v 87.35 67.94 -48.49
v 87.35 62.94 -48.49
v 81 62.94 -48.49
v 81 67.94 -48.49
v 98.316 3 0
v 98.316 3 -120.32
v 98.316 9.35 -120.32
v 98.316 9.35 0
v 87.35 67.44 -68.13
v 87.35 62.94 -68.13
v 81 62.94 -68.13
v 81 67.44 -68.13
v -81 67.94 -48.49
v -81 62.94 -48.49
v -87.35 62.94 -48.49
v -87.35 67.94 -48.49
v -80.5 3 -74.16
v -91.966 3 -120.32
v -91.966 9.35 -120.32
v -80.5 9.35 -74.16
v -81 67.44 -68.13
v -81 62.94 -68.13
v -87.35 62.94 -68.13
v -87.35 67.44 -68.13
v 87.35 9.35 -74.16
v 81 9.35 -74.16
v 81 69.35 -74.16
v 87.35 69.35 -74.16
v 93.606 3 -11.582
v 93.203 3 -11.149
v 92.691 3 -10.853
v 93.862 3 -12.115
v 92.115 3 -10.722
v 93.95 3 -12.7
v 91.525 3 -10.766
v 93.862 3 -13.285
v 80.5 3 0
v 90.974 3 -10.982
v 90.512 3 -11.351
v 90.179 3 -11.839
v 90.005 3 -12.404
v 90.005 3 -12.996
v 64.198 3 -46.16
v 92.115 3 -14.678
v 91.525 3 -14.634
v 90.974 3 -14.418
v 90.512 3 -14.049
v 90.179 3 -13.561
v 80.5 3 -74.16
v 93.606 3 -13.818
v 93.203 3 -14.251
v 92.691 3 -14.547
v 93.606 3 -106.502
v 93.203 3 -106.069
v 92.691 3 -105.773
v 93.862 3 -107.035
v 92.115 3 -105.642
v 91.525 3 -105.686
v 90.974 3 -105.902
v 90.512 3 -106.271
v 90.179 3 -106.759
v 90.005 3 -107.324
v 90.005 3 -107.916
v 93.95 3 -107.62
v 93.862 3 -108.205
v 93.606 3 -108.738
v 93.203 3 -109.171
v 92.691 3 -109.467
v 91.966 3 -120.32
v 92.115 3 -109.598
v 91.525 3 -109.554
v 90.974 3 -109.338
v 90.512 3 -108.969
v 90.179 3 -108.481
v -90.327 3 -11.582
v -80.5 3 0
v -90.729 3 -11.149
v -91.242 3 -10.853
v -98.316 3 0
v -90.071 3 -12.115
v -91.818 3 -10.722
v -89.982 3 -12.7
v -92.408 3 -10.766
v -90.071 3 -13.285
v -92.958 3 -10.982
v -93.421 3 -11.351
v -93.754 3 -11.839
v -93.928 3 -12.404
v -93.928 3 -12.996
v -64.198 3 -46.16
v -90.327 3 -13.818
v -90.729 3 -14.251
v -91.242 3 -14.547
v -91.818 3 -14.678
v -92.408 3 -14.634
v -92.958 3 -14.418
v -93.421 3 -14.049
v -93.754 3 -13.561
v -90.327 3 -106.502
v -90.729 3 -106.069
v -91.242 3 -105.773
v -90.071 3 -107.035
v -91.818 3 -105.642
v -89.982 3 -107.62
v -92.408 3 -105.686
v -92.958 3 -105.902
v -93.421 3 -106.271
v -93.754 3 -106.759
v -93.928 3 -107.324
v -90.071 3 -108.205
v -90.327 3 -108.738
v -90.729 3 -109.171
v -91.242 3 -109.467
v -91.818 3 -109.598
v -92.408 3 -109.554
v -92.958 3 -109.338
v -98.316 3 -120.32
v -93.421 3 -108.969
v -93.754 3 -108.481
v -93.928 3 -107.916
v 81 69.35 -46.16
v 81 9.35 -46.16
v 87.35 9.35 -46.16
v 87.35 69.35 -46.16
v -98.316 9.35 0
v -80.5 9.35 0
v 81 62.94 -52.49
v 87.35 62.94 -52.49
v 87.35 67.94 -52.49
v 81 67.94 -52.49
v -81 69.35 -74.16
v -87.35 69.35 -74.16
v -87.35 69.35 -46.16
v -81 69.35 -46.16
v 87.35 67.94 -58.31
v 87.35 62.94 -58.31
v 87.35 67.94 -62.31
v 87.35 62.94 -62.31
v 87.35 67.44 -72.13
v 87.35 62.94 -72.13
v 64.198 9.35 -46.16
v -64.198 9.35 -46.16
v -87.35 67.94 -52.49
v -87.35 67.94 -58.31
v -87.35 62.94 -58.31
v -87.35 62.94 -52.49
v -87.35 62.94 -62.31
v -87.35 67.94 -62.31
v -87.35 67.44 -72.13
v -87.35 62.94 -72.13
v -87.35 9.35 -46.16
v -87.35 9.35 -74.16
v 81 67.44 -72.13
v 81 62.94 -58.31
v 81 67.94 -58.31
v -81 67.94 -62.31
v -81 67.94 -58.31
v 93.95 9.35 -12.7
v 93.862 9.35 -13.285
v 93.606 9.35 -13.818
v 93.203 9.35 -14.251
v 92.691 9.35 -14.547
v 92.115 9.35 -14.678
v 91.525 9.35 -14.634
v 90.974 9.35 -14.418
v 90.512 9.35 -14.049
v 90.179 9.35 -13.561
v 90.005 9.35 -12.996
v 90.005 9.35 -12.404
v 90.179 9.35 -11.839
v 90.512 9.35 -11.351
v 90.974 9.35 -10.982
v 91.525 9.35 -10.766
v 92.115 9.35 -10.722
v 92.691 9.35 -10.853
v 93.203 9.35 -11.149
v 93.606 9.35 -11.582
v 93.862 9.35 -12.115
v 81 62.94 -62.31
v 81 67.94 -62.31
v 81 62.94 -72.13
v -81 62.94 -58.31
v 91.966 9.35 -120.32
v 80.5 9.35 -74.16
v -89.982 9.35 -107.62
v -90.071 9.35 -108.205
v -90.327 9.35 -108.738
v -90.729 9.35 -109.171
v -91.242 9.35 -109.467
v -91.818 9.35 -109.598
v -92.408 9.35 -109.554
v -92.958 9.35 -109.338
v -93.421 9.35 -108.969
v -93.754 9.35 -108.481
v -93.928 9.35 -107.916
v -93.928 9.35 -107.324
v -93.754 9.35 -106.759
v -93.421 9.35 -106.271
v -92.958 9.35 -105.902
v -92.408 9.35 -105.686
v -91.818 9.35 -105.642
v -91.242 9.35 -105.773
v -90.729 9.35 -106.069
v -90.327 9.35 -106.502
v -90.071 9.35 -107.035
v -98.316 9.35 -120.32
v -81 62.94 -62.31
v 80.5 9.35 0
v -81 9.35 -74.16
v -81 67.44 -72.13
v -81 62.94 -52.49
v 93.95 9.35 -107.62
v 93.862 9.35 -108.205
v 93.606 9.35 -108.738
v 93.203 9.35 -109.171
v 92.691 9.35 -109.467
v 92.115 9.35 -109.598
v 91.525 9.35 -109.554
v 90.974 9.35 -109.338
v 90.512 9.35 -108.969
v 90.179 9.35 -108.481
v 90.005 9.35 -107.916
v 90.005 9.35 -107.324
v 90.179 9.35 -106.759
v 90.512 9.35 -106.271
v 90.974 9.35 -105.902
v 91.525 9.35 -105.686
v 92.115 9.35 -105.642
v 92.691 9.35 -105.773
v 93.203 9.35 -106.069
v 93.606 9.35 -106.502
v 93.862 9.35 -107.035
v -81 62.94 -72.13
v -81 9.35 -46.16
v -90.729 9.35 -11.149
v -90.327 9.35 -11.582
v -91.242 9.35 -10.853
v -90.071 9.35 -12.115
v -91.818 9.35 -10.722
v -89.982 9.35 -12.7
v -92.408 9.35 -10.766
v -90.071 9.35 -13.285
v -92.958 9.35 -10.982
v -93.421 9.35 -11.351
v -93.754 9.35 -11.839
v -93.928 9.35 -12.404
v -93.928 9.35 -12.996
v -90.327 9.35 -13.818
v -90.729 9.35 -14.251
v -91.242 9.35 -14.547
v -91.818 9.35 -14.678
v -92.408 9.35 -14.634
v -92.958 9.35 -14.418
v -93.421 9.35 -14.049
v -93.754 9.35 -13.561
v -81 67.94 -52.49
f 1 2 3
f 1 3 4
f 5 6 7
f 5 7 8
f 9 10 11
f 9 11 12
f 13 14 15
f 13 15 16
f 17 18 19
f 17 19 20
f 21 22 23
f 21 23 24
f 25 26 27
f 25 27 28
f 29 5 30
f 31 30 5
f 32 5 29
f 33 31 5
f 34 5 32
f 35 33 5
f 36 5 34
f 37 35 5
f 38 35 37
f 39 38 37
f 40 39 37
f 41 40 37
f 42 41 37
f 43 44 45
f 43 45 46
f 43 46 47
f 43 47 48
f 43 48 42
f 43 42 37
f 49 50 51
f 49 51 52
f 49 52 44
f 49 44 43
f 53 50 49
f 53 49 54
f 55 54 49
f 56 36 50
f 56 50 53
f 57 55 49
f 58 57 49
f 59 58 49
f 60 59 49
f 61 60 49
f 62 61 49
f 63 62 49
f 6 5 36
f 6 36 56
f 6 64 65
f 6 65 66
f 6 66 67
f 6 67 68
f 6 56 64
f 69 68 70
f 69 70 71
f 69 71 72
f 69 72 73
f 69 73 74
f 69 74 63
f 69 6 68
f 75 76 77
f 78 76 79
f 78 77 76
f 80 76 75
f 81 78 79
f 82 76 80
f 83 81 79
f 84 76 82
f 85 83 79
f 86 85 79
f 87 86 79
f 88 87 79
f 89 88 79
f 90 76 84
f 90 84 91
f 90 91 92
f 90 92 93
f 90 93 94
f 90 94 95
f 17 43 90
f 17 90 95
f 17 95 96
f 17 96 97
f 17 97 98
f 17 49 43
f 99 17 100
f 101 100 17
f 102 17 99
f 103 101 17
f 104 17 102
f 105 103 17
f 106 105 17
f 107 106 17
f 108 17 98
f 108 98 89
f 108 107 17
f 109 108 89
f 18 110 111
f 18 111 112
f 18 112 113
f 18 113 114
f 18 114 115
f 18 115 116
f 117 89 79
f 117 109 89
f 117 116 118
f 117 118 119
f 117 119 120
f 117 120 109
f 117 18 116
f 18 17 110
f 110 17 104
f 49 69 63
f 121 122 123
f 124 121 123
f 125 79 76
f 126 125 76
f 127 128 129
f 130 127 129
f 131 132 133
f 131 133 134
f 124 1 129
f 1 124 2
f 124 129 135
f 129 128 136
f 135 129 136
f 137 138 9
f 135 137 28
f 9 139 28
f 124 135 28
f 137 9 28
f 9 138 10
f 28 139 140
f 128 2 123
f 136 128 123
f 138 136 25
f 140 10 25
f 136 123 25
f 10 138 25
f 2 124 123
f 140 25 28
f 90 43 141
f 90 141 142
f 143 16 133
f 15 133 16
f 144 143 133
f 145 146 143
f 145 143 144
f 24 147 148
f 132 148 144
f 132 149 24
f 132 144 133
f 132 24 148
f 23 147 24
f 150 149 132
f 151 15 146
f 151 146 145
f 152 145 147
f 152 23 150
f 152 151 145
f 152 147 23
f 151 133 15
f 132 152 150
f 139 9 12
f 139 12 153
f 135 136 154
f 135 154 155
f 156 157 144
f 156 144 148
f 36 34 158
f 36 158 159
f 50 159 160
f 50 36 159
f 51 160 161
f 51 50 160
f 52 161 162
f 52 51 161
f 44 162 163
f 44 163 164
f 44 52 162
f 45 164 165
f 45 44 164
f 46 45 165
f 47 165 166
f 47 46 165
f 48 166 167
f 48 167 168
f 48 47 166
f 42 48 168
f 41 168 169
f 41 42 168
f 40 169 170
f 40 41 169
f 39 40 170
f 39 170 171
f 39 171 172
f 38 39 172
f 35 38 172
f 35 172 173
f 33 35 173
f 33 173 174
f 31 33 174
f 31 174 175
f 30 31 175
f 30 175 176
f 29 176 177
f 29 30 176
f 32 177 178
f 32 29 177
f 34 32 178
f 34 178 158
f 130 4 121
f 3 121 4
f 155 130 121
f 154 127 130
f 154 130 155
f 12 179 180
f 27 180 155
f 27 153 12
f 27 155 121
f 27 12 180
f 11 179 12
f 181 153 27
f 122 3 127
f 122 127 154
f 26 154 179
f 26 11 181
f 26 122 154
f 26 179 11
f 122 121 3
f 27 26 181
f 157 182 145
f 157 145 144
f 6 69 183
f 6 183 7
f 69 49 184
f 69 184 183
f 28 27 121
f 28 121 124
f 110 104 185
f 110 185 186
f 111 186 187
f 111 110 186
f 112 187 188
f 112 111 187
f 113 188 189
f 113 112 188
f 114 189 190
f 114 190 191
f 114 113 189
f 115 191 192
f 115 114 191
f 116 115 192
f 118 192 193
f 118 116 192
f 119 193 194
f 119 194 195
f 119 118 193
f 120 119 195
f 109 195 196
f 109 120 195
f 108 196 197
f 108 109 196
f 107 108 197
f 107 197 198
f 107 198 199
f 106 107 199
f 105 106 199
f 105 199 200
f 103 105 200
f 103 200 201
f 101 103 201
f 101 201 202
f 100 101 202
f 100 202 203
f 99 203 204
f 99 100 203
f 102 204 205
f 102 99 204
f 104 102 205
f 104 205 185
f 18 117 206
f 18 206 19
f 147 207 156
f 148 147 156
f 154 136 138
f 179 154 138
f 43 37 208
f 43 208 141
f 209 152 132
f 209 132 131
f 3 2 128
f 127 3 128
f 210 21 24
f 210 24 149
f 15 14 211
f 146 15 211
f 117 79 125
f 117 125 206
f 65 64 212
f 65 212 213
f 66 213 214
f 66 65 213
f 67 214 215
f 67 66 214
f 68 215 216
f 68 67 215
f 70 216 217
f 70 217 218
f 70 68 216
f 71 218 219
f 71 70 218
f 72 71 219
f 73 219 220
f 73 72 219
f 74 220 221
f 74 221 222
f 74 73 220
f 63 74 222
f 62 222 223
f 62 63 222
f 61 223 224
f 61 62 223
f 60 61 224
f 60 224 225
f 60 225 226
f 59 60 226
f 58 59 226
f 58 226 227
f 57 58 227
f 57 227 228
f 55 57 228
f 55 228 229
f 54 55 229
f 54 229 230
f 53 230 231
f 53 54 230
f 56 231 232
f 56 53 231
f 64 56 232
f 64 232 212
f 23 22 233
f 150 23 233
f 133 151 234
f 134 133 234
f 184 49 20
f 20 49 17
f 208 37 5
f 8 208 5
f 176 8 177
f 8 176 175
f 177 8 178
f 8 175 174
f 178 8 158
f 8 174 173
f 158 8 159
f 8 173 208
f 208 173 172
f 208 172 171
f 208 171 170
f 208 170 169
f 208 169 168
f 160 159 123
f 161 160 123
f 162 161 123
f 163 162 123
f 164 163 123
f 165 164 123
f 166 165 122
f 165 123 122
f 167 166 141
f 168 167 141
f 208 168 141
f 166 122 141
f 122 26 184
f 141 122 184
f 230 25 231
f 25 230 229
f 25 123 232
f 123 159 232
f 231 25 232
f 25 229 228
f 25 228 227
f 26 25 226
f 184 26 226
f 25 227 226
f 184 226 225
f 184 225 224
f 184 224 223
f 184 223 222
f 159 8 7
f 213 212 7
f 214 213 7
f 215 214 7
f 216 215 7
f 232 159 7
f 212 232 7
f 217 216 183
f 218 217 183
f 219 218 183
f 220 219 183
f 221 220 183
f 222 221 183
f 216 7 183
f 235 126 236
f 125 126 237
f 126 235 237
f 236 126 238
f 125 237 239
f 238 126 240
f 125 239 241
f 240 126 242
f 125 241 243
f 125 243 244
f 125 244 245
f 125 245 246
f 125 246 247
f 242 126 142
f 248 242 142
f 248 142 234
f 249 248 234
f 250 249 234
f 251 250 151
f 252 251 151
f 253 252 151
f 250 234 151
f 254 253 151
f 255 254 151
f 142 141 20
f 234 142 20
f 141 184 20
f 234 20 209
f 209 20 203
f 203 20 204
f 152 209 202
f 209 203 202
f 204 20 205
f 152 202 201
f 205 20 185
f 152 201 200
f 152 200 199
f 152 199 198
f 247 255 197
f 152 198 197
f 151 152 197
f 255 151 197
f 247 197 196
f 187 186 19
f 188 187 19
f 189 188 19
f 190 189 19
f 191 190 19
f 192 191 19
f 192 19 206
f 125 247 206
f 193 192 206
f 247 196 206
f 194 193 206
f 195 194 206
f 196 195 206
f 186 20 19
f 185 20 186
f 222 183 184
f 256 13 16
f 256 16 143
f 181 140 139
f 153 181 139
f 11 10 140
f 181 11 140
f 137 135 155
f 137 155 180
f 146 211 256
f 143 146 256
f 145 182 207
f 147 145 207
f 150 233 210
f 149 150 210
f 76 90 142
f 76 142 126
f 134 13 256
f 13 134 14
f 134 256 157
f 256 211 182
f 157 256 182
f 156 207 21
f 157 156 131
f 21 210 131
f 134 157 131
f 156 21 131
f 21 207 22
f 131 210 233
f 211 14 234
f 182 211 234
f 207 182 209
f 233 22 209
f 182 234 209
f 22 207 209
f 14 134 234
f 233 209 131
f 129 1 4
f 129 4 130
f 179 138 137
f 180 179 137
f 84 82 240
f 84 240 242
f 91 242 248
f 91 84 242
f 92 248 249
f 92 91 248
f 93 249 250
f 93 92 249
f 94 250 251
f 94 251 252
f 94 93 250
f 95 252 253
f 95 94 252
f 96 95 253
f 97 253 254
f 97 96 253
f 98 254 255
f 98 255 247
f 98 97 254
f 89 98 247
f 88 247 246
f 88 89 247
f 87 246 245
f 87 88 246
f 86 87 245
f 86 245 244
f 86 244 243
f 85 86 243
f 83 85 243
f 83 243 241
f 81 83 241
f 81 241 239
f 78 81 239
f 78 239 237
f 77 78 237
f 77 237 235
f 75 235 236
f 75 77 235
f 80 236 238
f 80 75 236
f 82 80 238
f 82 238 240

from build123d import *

# Parameters (mm, degrees)
SKETCH_6_R          = 1.984
EXTRUDE_2_DEPTH     = 6.35
SKETCH_7_W          = 6.35
SKETCH_7_H          = 28
EXTRUDE_3_DEPTH     = 60
SKETCH_8_W          = 4
SKETCH_8_H          = 5
SKETCH_8_H_2        = 4.5
CUT_EXTRUDE_3_DEPTH = 250


with BuildPart() as part:
    # 草图6 → 凸台-拉伸2 (new body)
    with BuildSketch(Plane(origin=(0, 3, 0), x_dir=(1, 0, 0), z_dir=(0, 1, 0))):
        Polygon((98.316405333, 0), (91.966405333, 0), (80.5, 0), (64.197651568, 46.16), (-64.197651568, 46.16), (-80.5, 0), (-91.966405333, 0), (-98.316405333, 0), (-98.316405333, 120.32), (-91.966405333, 120.32), (-80.5, 74.16), (-64.197651568, 74.16), (64.197651568, 74.16), (80.5, 74.16), (91.966405333, 120.32), (98.316405333, 120.32), align=None)
        with Locations((91.966405333, 12.7)):
            Circle(SKETCH_6_R, mode=Mode.SUBTRACT)
        with Locations((91.966405333, 107.62)):
            Circle(SKETCH_6_R, mode=Mode.SUBTRACT)
        with Locations((-91.966405333, 12.7)):
            Circle(SKETCH_6_R, mode=Mode.SUBTRACT)
        with Locations((-91.966405333, 107.62)):
            Circle(SKETCH_6_R, mode=Mode.SUBTRACT)
    extrude(amount=EXTRUDE_2_DEPTH)

    # 草图7 → 凸台-拉伸3 (add)
    with BuildSketch(Plane(origin=(0, 9.35, 0), x_dir=(1, 0, 0), z_dir=(0, 1, 0))):
        with Locations((84.175, 60.16)):
            Rectangle(SKETCH_7_W, SKETCH_7_H)
        with Locations((-84.175, 60.16)):
            Rectangle(SKETCH_7_W, SKETCH_7_H)
    extrude(amount=EXTRUDE_3_DEPTH)

    # 草图8 → 切除-拉伸3 (cut)
    with BuildSketch(Plane(origin=(87.35, 0, 0), x_dir=(0, 0, -1), z_dir=(1, 0, 0))):
        with Locations((50.49, 65.44)):
            Rectangle(SKETCH_8_W, SKETCH_8_H)
        with Locations((60.31, 65.44)):
            Rectangle(SKETCH_8_W, SKETCH_8_H)
        with Locations((70.13, 65.19)):
            Rectangle(SKETCH_8_W, SKETCH_8_H_2)
    extrude(amount=-CUT_EXTRUDE_3_DEPTH, mode=Mode.SUBTRACT)


solid = part.part
